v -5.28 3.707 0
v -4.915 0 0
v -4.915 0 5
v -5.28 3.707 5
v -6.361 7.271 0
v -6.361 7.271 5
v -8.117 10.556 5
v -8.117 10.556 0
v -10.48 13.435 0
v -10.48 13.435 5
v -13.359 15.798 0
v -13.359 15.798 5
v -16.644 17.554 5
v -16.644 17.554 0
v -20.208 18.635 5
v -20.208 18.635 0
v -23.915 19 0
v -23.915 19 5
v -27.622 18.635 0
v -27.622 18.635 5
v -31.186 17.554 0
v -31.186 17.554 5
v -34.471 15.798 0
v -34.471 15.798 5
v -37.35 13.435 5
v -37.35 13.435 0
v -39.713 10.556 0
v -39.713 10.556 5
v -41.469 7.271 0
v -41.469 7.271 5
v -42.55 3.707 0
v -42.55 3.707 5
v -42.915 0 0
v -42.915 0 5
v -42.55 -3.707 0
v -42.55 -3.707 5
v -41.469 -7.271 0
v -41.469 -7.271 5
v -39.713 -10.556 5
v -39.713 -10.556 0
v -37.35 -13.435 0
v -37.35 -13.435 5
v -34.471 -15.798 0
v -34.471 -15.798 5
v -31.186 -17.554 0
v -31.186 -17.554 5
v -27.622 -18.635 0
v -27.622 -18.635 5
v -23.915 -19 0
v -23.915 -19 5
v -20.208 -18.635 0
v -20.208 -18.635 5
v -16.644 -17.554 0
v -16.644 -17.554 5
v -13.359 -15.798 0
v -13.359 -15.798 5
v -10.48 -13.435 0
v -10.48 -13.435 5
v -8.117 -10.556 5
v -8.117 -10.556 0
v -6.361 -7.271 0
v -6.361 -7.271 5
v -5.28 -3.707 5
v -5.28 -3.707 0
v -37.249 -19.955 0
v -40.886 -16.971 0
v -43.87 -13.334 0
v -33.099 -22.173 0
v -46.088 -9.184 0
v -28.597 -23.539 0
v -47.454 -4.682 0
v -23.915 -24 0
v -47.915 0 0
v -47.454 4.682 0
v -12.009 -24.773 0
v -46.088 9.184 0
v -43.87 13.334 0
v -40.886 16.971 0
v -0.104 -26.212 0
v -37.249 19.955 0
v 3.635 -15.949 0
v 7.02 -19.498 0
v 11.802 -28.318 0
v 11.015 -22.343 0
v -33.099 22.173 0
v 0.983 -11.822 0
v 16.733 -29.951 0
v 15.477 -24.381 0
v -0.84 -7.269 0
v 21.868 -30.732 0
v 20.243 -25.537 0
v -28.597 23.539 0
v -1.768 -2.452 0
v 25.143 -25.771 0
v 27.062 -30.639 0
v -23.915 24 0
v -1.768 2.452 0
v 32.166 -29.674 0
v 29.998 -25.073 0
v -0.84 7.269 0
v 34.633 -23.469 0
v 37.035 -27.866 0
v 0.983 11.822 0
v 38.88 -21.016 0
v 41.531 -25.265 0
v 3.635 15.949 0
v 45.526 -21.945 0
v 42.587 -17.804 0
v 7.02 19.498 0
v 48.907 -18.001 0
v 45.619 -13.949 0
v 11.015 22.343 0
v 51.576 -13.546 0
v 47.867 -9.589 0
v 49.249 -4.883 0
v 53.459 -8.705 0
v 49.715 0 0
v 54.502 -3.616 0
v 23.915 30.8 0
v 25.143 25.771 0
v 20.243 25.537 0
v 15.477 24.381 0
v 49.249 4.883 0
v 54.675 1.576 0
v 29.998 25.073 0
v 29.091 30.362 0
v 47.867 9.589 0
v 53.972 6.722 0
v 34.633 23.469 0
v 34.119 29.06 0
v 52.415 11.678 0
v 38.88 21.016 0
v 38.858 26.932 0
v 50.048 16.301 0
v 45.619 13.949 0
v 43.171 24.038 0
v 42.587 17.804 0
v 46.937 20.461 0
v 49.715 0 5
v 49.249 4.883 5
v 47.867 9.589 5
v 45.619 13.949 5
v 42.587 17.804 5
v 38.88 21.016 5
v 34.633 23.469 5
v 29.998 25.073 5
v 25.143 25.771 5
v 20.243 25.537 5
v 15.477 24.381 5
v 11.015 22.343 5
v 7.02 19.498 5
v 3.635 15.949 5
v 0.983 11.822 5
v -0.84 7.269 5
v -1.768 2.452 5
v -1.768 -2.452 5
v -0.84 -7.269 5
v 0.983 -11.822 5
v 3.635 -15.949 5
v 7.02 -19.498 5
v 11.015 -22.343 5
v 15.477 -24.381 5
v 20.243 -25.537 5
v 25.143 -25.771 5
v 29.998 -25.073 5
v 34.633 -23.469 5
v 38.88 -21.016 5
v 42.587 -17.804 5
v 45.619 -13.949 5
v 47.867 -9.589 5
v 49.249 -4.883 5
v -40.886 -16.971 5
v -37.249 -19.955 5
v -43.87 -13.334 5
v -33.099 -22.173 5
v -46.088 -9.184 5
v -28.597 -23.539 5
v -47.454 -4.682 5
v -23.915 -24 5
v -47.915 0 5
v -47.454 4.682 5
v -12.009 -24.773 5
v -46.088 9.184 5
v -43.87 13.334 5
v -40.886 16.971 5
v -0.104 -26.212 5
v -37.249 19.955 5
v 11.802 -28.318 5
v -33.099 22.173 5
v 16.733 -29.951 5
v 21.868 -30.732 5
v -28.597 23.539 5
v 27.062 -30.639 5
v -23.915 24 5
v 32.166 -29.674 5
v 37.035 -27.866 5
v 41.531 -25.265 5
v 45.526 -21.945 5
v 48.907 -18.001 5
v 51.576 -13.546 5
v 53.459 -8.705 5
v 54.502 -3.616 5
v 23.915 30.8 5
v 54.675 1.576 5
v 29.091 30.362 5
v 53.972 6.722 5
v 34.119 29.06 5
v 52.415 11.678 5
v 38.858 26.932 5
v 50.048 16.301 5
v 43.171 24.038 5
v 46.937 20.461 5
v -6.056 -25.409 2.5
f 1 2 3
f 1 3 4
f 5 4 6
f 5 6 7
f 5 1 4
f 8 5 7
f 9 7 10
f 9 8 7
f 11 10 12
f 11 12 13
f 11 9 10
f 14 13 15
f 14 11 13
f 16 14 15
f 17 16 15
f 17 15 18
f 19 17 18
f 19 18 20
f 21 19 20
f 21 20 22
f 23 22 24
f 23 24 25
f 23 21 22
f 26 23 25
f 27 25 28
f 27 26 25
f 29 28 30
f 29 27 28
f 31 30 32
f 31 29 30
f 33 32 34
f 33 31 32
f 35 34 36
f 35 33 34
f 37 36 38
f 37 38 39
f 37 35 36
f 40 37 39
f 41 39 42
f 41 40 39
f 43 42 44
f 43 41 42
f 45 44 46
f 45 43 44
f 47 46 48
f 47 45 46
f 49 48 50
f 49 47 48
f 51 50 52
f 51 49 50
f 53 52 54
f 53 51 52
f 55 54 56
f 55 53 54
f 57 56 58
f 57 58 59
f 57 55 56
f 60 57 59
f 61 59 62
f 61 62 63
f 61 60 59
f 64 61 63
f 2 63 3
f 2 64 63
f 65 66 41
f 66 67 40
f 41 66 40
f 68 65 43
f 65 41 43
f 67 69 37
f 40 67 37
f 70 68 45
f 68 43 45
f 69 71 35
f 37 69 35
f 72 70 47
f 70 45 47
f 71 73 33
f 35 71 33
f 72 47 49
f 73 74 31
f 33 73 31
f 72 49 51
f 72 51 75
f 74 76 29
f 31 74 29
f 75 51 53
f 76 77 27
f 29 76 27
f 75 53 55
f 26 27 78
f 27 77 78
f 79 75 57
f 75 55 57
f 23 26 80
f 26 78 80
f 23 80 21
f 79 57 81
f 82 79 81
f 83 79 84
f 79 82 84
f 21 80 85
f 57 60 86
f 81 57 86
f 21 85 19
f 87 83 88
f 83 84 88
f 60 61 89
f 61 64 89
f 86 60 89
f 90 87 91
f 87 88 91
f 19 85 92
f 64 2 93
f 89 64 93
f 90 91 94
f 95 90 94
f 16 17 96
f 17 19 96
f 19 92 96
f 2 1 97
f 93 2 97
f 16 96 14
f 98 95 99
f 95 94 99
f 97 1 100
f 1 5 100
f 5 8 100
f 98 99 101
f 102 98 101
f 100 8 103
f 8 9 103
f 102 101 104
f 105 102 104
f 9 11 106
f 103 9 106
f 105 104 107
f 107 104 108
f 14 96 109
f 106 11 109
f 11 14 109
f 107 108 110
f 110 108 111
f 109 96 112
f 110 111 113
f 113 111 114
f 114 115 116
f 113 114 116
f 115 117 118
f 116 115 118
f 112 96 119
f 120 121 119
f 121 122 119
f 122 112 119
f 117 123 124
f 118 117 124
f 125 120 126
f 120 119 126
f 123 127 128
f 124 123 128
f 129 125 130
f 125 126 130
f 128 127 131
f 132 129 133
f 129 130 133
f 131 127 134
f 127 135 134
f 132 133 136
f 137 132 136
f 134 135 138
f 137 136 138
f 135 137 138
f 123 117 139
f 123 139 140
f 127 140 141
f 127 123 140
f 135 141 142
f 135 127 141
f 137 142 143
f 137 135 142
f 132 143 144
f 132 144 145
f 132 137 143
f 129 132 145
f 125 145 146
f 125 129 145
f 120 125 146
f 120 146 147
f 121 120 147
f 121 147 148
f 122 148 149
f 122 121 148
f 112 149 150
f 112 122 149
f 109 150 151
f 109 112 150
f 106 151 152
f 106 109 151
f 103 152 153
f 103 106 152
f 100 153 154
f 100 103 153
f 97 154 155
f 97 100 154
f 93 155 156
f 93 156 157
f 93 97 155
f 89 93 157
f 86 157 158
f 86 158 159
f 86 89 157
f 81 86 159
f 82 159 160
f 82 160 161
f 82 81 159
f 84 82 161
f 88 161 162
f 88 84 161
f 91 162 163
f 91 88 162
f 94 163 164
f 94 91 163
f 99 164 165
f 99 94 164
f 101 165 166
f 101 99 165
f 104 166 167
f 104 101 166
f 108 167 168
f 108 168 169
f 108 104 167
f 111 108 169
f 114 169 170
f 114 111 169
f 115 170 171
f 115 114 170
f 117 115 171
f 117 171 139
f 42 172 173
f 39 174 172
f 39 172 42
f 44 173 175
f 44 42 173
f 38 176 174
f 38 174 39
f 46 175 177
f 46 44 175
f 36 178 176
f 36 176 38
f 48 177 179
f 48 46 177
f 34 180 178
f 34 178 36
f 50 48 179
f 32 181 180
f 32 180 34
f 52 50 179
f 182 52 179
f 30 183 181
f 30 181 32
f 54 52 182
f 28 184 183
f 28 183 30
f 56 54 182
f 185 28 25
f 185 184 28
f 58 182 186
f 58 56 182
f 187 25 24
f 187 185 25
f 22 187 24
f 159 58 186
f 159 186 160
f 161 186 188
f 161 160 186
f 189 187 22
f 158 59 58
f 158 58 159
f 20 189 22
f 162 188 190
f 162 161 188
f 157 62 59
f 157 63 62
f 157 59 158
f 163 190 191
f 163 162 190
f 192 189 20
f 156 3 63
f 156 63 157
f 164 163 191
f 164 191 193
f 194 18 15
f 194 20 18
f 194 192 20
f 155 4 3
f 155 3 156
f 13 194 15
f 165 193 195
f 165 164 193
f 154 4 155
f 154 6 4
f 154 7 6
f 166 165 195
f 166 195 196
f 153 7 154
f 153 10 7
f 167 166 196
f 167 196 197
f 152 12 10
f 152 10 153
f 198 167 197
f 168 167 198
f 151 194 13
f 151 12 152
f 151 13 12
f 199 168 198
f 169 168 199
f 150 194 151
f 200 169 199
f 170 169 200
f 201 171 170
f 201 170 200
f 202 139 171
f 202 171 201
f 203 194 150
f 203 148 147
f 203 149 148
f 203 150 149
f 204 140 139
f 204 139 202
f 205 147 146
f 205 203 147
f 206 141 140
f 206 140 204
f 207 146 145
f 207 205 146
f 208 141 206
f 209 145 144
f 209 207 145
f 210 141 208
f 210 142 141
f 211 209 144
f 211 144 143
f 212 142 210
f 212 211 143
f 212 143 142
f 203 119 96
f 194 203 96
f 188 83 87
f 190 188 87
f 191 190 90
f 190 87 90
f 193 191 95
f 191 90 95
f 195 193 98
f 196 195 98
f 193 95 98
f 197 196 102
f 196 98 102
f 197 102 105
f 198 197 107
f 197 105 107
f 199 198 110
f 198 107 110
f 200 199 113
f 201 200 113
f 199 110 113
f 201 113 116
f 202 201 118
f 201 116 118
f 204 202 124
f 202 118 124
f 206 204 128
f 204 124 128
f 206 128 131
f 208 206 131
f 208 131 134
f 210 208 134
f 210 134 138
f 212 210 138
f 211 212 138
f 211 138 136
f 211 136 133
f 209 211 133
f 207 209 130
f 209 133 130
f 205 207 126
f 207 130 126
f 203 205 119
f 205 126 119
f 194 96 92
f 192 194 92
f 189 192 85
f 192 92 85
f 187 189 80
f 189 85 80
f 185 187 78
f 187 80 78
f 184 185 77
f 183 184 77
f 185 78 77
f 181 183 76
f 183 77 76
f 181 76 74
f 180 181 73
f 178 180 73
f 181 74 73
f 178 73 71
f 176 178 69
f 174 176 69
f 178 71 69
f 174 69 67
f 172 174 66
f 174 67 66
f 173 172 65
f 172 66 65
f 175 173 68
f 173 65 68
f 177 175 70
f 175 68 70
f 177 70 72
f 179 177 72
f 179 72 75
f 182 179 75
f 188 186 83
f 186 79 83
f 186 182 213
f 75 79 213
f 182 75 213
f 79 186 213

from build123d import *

# Parameters (mm, degrees)
ESBO_O1_R                = 25.8
ESBO_O1_R_2              = 19
RESSALTO_EXTRUS_O1_DEPTH = 5


with BuildPart() as part:
    # Esboço1 → Ressalto-extrusão1 (new body)
    with BuildSketch(Plane.XY):
        with BuildLine():
            ThreePointArc((-23.915, 24), (-47.915, 0), (-23.915, -24))
            add(Edge.make_bspline(
                [(-23.915, -24), (-6.056429517, -24.659084063), (11.802140965, -28.318168126)],
                knots=[0, 0, 0, 0.74675185, 0.74675185, 0.74675185], degree=2))
            ThreePointArc((11.802140965, -28.318168126), (54.088163393, -6.18224966), (23.915, 30.8))
            Line((23.915, 30.8), (-23.915, 24))
        make_face()
        with Locations((23.915, 0)):
            Circle(ESBO_O1_R, mode=Mode.SUBTRACT)
        with Locations((-23.915, 0)):
            Circle(ESBO_O1_R_2, mode=Mode.SUBTRACT)
    extrude(amount=RESSALTO_EXTRUS_O1_DEPTH)


solid = part.part
